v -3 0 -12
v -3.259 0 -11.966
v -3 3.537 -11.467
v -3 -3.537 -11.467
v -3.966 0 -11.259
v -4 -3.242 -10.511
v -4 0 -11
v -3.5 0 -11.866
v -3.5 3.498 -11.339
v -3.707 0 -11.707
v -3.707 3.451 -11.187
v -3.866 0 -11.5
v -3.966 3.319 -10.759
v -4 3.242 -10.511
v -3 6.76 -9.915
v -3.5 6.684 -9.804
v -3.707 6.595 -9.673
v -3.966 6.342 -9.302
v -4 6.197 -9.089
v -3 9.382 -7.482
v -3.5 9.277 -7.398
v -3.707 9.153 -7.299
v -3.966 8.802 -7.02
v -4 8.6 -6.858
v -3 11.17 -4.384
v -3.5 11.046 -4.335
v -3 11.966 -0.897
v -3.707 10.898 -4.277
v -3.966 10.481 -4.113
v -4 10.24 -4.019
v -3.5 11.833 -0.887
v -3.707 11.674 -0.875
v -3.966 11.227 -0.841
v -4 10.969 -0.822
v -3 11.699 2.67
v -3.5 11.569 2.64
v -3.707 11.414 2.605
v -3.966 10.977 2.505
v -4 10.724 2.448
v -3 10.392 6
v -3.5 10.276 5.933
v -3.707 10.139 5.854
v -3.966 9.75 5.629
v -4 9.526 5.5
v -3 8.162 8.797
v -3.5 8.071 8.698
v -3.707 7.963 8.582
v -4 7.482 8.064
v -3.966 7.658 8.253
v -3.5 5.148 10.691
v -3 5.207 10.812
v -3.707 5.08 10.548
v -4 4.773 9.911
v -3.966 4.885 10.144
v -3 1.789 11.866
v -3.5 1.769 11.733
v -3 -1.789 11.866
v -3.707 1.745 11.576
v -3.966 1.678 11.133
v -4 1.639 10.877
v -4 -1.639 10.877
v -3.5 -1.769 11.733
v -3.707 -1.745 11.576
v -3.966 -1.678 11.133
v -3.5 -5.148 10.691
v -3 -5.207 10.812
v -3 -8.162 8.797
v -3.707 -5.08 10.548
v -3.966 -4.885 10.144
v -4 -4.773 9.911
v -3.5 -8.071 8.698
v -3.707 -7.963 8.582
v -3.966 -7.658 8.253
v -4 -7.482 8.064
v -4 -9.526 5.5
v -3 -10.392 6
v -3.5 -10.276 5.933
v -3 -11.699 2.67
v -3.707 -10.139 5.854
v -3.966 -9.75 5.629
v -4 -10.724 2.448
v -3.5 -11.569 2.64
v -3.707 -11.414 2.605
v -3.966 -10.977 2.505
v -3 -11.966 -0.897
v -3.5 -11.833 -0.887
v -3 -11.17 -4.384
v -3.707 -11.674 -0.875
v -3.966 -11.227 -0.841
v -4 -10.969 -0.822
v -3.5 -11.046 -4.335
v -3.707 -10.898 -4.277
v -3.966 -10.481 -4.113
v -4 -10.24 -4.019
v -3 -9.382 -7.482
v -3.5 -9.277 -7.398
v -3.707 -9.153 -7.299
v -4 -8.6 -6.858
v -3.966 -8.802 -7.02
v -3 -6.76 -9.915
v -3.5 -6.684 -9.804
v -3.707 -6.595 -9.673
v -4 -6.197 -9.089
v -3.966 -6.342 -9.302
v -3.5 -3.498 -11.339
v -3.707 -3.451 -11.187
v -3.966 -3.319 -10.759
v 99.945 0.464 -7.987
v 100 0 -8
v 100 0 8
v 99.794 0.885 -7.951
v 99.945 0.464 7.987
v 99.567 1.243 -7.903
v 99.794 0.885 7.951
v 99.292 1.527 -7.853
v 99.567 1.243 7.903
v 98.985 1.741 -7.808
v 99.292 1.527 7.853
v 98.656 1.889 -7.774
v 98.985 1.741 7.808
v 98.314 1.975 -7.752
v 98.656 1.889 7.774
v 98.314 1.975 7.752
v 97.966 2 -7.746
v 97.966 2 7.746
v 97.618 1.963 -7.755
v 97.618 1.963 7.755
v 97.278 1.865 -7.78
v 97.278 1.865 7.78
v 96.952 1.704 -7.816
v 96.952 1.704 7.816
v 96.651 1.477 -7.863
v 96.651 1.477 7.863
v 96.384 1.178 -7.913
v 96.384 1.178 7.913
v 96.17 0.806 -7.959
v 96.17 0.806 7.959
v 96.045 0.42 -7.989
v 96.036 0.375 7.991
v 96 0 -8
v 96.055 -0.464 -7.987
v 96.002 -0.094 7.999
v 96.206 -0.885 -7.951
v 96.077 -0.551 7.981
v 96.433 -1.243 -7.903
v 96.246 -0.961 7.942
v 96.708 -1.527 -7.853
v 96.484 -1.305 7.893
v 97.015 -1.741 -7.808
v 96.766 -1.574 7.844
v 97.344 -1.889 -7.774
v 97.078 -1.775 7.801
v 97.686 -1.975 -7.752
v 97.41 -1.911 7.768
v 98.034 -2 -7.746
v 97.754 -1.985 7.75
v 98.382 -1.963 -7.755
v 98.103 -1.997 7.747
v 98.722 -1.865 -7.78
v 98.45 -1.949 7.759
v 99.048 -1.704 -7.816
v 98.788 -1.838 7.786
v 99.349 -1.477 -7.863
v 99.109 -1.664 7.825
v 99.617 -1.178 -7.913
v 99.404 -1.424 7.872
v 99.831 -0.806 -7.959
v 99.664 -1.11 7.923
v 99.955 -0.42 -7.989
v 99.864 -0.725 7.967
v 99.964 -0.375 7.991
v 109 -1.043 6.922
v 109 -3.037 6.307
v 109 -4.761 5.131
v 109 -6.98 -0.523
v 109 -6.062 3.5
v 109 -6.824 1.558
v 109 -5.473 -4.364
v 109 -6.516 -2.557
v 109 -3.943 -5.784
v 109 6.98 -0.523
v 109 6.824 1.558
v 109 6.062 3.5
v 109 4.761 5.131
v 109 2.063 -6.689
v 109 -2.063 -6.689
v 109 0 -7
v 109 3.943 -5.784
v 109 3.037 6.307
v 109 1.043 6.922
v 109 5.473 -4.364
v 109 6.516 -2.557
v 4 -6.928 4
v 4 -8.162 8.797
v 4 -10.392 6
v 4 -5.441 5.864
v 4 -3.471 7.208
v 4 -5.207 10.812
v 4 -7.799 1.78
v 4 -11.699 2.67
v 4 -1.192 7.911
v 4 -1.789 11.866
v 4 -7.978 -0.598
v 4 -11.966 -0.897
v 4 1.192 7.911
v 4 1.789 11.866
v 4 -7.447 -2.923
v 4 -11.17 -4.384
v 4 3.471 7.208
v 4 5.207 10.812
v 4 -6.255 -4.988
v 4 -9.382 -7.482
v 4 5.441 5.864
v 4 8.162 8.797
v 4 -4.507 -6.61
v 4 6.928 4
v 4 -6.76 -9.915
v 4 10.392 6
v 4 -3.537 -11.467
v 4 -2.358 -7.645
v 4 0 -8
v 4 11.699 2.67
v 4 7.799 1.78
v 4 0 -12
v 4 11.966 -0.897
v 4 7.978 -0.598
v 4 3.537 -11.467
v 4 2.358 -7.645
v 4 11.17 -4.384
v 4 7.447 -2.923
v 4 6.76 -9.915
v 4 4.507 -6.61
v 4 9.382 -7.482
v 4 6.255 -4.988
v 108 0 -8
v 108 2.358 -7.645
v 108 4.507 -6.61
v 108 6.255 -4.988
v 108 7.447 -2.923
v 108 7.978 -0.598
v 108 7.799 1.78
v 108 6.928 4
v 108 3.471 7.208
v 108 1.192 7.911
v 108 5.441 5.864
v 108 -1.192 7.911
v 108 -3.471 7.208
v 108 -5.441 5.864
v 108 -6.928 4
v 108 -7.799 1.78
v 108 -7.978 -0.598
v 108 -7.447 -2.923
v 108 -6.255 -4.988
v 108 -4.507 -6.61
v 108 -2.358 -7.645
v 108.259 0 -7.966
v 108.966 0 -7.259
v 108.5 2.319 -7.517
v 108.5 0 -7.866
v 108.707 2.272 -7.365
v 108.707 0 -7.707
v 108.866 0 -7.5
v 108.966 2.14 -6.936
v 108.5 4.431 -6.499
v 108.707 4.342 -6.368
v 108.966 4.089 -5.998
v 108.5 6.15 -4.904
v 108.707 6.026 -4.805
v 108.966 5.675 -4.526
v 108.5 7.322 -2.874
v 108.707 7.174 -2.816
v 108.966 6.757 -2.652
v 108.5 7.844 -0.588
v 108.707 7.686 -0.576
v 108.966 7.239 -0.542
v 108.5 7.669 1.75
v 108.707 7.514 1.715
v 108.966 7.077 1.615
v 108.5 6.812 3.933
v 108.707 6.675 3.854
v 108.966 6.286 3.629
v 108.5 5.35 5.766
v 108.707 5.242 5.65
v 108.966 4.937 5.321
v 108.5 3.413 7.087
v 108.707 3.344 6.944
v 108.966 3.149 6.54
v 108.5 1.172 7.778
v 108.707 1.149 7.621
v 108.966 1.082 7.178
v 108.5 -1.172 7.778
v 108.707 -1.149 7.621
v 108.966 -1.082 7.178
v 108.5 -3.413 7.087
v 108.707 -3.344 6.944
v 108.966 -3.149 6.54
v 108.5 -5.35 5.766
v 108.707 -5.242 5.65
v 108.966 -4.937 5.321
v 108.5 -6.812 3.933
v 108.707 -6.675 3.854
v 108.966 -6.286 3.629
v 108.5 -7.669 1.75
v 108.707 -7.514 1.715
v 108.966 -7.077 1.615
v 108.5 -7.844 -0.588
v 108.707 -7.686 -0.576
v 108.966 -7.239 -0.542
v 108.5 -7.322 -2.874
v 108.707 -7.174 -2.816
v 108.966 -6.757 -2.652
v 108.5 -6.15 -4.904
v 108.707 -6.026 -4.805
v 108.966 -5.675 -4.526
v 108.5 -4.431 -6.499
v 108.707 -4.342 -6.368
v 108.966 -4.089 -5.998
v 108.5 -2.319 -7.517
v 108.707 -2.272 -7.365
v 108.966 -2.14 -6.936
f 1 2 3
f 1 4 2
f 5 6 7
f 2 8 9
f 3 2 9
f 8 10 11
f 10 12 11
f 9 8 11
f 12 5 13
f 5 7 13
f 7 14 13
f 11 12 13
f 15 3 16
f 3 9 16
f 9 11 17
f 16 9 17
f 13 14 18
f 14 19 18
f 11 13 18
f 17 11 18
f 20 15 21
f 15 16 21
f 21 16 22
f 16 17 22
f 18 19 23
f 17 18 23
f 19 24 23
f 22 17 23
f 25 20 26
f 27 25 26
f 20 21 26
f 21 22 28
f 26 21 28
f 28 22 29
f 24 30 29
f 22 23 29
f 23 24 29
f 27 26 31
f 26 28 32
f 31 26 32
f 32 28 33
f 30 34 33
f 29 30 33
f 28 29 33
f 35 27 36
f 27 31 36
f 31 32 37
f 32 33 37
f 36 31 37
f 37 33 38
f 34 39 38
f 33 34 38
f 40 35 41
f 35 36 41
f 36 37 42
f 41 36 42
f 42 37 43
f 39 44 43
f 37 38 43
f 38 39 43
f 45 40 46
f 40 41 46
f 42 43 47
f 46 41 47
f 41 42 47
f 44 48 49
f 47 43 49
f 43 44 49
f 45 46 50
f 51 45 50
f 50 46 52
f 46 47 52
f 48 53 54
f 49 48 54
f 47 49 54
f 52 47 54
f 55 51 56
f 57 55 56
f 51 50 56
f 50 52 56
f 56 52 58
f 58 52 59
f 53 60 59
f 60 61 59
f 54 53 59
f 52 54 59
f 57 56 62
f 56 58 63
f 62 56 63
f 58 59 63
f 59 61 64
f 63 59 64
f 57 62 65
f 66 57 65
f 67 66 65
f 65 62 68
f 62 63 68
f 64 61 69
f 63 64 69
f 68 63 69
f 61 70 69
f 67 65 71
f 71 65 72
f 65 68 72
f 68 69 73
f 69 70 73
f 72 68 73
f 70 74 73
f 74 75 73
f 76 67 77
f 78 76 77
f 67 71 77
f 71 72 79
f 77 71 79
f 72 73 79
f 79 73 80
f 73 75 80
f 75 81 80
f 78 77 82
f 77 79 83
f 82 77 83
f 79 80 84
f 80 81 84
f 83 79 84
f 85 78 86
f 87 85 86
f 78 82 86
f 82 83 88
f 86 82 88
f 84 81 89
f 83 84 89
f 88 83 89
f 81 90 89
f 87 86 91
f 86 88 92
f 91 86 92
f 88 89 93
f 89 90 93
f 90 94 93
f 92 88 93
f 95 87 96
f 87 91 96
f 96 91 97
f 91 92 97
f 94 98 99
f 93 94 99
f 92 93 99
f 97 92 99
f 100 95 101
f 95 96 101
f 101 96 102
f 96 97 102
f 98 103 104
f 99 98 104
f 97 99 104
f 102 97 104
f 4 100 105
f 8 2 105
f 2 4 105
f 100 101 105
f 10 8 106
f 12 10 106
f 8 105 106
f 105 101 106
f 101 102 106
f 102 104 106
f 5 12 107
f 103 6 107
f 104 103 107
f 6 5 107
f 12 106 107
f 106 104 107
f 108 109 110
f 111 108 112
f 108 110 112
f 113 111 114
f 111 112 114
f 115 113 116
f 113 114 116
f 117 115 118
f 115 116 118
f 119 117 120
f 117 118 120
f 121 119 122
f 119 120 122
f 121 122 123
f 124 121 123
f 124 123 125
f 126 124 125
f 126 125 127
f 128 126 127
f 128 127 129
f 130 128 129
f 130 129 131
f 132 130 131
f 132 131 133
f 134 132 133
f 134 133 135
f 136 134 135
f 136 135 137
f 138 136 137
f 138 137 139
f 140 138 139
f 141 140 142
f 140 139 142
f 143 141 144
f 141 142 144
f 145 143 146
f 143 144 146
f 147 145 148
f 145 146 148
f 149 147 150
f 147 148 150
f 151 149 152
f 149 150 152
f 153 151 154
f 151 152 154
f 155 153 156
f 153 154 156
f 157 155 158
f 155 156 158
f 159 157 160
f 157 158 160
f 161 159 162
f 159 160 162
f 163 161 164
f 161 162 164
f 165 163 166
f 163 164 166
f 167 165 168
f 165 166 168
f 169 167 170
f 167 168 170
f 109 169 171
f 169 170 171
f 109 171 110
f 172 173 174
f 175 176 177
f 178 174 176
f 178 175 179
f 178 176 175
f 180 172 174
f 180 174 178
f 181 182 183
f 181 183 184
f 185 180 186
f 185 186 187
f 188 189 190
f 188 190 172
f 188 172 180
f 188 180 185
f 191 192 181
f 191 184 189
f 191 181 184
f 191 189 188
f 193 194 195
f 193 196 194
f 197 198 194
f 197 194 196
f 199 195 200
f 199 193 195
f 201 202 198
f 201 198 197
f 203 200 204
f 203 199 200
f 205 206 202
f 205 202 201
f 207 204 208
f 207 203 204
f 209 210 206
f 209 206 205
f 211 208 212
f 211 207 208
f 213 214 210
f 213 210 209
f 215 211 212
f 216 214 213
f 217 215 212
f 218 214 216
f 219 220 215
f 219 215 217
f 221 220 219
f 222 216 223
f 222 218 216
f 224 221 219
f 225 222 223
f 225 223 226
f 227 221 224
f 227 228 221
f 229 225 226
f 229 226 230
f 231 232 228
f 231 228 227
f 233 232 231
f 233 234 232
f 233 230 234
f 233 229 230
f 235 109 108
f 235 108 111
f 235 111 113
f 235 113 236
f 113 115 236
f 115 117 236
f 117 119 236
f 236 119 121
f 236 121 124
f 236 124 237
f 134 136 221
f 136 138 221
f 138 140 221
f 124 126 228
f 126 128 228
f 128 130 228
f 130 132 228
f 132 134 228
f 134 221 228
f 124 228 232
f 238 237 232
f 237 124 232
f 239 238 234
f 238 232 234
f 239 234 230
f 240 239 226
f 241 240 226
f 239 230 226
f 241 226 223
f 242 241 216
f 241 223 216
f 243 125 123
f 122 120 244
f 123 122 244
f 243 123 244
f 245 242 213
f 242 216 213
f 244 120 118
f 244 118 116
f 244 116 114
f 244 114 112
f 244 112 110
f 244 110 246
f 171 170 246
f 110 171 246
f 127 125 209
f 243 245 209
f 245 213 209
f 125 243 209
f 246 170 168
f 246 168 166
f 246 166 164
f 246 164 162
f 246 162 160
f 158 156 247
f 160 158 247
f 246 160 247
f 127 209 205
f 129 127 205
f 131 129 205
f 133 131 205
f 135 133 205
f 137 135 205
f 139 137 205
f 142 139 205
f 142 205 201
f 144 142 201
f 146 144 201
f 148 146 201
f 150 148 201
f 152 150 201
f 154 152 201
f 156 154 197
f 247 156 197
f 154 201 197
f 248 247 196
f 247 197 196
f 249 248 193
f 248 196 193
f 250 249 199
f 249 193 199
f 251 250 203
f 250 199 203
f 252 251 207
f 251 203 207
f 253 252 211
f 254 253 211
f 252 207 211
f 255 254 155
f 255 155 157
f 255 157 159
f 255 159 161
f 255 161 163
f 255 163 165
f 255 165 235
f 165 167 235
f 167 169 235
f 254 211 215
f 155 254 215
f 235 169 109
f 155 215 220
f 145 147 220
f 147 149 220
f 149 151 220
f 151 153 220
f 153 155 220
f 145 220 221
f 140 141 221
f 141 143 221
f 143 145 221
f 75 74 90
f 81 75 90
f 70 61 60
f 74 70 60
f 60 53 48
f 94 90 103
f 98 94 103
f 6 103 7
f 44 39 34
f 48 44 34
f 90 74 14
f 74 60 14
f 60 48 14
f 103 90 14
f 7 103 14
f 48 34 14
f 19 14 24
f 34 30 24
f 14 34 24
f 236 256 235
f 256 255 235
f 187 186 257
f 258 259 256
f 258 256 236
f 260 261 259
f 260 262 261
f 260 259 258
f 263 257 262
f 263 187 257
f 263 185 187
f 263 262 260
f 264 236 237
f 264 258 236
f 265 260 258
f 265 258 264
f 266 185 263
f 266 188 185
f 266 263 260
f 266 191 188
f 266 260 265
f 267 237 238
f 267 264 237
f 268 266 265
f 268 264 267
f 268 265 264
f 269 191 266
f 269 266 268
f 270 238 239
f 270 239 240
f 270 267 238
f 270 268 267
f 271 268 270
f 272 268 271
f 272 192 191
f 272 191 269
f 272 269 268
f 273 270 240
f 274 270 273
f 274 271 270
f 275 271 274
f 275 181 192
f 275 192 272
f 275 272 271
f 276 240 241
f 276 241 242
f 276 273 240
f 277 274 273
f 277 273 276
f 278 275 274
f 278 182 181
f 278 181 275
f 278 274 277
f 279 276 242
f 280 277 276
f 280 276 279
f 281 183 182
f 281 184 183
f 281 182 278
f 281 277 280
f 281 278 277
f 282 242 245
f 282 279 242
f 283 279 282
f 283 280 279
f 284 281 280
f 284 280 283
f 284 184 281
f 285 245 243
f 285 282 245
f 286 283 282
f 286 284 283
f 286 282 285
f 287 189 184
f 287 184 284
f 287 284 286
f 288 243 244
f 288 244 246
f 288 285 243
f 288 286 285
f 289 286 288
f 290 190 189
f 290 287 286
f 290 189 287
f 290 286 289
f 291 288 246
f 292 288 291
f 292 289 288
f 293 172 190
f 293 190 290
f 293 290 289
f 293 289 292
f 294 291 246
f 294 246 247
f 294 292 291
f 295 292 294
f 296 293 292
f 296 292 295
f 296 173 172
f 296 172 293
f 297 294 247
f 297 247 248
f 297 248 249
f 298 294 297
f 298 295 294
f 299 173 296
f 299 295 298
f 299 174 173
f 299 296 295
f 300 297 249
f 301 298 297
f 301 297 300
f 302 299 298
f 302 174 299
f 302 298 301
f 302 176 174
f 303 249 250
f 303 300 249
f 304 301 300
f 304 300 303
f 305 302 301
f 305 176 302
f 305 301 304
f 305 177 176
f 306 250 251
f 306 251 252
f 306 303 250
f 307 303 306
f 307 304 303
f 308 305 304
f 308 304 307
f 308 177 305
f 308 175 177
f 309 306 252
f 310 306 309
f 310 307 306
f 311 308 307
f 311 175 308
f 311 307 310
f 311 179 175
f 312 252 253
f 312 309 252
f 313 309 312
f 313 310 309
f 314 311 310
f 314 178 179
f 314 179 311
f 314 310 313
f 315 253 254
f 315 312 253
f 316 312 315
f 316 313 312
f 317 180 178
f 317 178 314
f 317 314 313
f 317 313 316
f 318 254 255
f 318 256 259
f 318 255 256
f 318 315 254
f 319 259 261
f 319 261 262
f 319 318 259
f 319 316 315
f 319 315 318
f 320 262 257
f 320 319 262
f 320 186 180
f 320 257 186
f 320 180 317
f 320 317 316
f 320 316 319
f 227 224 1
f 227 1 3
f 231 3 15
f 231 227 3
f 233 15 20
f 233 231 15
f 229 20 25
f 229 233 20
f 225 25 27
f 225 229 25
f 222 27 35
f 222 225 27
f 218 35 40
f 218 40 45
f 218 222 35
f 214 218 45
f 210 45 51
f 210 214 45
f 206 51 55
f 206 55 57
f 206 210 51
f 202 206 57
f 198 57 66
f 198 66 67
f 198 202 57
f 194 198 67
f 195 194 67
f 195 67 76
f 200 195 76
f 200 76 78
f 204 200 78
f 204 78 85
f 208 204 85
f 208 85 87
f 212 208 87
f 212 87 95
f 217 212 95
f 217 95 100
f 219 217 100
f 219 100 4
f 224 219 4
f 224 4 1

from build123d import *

# Parameters (mm, degrees)
SKETCH2_R           = 12
BOSS_EXTRUDE1_DEPTH = 4
SKETCH3_R           = 8
BOSS_EXTRUDE2_DEPTH = 105
FILLET1_R           = 1
FILLET2_R           = 1
SKETCH4_R           = 2
CUT_EXTRUDE1_DEPTH  = 10


with BuildPart() as part:
    # Sketch2 → Boss-Extrude1 (new body, symmetric)
    with BuildSketch(Plane(origin=(0, 0, 0), x_dir=(0, 0, -1), z_dir=(1, 0, 0))):
        Circle(SKETCH2_R)
    extrude(amount=BOSS_EXTRUDE1_DEPTH, both=True)

    # Sketch3 → Boss-Extrude2 (add)
    with BuildSketch(Plane(origin=(4, 0, 0), x_dir=(0, 0, -1), z_dir=(1, 0, 0))):
        Circle(SKETCH3_R)
    extrude(amount=BOSS_EXTRUDE2_DEPTH)

    # Fillet1
    fillet1_edges = [part.edges().sort_by_distance(p)[0] for p in [
        (-4, 0, 12),
    ]]
    fillet(fillet1_edges, radius=FILLET1_R)

    # Fillet2
    fillet2_edges = [part.edges().sort_by_distance(p)[0] for p in [
        (109, 0, 8),
    ]]
    fillet(fillet2_edges, radius=FILLET2_R)

    # Sketch4 → Cut-Extrude1 (cut, symmetric)
    with BuildSketch(Plane.XY):
        with Locations((98, 0)):
            Circle(SKETCH4_R)
    extrude(amount=CUT_EXTRUDE1_DEPTH, both=True, mode=Mode.SUBTRACT)


solid = part.part
